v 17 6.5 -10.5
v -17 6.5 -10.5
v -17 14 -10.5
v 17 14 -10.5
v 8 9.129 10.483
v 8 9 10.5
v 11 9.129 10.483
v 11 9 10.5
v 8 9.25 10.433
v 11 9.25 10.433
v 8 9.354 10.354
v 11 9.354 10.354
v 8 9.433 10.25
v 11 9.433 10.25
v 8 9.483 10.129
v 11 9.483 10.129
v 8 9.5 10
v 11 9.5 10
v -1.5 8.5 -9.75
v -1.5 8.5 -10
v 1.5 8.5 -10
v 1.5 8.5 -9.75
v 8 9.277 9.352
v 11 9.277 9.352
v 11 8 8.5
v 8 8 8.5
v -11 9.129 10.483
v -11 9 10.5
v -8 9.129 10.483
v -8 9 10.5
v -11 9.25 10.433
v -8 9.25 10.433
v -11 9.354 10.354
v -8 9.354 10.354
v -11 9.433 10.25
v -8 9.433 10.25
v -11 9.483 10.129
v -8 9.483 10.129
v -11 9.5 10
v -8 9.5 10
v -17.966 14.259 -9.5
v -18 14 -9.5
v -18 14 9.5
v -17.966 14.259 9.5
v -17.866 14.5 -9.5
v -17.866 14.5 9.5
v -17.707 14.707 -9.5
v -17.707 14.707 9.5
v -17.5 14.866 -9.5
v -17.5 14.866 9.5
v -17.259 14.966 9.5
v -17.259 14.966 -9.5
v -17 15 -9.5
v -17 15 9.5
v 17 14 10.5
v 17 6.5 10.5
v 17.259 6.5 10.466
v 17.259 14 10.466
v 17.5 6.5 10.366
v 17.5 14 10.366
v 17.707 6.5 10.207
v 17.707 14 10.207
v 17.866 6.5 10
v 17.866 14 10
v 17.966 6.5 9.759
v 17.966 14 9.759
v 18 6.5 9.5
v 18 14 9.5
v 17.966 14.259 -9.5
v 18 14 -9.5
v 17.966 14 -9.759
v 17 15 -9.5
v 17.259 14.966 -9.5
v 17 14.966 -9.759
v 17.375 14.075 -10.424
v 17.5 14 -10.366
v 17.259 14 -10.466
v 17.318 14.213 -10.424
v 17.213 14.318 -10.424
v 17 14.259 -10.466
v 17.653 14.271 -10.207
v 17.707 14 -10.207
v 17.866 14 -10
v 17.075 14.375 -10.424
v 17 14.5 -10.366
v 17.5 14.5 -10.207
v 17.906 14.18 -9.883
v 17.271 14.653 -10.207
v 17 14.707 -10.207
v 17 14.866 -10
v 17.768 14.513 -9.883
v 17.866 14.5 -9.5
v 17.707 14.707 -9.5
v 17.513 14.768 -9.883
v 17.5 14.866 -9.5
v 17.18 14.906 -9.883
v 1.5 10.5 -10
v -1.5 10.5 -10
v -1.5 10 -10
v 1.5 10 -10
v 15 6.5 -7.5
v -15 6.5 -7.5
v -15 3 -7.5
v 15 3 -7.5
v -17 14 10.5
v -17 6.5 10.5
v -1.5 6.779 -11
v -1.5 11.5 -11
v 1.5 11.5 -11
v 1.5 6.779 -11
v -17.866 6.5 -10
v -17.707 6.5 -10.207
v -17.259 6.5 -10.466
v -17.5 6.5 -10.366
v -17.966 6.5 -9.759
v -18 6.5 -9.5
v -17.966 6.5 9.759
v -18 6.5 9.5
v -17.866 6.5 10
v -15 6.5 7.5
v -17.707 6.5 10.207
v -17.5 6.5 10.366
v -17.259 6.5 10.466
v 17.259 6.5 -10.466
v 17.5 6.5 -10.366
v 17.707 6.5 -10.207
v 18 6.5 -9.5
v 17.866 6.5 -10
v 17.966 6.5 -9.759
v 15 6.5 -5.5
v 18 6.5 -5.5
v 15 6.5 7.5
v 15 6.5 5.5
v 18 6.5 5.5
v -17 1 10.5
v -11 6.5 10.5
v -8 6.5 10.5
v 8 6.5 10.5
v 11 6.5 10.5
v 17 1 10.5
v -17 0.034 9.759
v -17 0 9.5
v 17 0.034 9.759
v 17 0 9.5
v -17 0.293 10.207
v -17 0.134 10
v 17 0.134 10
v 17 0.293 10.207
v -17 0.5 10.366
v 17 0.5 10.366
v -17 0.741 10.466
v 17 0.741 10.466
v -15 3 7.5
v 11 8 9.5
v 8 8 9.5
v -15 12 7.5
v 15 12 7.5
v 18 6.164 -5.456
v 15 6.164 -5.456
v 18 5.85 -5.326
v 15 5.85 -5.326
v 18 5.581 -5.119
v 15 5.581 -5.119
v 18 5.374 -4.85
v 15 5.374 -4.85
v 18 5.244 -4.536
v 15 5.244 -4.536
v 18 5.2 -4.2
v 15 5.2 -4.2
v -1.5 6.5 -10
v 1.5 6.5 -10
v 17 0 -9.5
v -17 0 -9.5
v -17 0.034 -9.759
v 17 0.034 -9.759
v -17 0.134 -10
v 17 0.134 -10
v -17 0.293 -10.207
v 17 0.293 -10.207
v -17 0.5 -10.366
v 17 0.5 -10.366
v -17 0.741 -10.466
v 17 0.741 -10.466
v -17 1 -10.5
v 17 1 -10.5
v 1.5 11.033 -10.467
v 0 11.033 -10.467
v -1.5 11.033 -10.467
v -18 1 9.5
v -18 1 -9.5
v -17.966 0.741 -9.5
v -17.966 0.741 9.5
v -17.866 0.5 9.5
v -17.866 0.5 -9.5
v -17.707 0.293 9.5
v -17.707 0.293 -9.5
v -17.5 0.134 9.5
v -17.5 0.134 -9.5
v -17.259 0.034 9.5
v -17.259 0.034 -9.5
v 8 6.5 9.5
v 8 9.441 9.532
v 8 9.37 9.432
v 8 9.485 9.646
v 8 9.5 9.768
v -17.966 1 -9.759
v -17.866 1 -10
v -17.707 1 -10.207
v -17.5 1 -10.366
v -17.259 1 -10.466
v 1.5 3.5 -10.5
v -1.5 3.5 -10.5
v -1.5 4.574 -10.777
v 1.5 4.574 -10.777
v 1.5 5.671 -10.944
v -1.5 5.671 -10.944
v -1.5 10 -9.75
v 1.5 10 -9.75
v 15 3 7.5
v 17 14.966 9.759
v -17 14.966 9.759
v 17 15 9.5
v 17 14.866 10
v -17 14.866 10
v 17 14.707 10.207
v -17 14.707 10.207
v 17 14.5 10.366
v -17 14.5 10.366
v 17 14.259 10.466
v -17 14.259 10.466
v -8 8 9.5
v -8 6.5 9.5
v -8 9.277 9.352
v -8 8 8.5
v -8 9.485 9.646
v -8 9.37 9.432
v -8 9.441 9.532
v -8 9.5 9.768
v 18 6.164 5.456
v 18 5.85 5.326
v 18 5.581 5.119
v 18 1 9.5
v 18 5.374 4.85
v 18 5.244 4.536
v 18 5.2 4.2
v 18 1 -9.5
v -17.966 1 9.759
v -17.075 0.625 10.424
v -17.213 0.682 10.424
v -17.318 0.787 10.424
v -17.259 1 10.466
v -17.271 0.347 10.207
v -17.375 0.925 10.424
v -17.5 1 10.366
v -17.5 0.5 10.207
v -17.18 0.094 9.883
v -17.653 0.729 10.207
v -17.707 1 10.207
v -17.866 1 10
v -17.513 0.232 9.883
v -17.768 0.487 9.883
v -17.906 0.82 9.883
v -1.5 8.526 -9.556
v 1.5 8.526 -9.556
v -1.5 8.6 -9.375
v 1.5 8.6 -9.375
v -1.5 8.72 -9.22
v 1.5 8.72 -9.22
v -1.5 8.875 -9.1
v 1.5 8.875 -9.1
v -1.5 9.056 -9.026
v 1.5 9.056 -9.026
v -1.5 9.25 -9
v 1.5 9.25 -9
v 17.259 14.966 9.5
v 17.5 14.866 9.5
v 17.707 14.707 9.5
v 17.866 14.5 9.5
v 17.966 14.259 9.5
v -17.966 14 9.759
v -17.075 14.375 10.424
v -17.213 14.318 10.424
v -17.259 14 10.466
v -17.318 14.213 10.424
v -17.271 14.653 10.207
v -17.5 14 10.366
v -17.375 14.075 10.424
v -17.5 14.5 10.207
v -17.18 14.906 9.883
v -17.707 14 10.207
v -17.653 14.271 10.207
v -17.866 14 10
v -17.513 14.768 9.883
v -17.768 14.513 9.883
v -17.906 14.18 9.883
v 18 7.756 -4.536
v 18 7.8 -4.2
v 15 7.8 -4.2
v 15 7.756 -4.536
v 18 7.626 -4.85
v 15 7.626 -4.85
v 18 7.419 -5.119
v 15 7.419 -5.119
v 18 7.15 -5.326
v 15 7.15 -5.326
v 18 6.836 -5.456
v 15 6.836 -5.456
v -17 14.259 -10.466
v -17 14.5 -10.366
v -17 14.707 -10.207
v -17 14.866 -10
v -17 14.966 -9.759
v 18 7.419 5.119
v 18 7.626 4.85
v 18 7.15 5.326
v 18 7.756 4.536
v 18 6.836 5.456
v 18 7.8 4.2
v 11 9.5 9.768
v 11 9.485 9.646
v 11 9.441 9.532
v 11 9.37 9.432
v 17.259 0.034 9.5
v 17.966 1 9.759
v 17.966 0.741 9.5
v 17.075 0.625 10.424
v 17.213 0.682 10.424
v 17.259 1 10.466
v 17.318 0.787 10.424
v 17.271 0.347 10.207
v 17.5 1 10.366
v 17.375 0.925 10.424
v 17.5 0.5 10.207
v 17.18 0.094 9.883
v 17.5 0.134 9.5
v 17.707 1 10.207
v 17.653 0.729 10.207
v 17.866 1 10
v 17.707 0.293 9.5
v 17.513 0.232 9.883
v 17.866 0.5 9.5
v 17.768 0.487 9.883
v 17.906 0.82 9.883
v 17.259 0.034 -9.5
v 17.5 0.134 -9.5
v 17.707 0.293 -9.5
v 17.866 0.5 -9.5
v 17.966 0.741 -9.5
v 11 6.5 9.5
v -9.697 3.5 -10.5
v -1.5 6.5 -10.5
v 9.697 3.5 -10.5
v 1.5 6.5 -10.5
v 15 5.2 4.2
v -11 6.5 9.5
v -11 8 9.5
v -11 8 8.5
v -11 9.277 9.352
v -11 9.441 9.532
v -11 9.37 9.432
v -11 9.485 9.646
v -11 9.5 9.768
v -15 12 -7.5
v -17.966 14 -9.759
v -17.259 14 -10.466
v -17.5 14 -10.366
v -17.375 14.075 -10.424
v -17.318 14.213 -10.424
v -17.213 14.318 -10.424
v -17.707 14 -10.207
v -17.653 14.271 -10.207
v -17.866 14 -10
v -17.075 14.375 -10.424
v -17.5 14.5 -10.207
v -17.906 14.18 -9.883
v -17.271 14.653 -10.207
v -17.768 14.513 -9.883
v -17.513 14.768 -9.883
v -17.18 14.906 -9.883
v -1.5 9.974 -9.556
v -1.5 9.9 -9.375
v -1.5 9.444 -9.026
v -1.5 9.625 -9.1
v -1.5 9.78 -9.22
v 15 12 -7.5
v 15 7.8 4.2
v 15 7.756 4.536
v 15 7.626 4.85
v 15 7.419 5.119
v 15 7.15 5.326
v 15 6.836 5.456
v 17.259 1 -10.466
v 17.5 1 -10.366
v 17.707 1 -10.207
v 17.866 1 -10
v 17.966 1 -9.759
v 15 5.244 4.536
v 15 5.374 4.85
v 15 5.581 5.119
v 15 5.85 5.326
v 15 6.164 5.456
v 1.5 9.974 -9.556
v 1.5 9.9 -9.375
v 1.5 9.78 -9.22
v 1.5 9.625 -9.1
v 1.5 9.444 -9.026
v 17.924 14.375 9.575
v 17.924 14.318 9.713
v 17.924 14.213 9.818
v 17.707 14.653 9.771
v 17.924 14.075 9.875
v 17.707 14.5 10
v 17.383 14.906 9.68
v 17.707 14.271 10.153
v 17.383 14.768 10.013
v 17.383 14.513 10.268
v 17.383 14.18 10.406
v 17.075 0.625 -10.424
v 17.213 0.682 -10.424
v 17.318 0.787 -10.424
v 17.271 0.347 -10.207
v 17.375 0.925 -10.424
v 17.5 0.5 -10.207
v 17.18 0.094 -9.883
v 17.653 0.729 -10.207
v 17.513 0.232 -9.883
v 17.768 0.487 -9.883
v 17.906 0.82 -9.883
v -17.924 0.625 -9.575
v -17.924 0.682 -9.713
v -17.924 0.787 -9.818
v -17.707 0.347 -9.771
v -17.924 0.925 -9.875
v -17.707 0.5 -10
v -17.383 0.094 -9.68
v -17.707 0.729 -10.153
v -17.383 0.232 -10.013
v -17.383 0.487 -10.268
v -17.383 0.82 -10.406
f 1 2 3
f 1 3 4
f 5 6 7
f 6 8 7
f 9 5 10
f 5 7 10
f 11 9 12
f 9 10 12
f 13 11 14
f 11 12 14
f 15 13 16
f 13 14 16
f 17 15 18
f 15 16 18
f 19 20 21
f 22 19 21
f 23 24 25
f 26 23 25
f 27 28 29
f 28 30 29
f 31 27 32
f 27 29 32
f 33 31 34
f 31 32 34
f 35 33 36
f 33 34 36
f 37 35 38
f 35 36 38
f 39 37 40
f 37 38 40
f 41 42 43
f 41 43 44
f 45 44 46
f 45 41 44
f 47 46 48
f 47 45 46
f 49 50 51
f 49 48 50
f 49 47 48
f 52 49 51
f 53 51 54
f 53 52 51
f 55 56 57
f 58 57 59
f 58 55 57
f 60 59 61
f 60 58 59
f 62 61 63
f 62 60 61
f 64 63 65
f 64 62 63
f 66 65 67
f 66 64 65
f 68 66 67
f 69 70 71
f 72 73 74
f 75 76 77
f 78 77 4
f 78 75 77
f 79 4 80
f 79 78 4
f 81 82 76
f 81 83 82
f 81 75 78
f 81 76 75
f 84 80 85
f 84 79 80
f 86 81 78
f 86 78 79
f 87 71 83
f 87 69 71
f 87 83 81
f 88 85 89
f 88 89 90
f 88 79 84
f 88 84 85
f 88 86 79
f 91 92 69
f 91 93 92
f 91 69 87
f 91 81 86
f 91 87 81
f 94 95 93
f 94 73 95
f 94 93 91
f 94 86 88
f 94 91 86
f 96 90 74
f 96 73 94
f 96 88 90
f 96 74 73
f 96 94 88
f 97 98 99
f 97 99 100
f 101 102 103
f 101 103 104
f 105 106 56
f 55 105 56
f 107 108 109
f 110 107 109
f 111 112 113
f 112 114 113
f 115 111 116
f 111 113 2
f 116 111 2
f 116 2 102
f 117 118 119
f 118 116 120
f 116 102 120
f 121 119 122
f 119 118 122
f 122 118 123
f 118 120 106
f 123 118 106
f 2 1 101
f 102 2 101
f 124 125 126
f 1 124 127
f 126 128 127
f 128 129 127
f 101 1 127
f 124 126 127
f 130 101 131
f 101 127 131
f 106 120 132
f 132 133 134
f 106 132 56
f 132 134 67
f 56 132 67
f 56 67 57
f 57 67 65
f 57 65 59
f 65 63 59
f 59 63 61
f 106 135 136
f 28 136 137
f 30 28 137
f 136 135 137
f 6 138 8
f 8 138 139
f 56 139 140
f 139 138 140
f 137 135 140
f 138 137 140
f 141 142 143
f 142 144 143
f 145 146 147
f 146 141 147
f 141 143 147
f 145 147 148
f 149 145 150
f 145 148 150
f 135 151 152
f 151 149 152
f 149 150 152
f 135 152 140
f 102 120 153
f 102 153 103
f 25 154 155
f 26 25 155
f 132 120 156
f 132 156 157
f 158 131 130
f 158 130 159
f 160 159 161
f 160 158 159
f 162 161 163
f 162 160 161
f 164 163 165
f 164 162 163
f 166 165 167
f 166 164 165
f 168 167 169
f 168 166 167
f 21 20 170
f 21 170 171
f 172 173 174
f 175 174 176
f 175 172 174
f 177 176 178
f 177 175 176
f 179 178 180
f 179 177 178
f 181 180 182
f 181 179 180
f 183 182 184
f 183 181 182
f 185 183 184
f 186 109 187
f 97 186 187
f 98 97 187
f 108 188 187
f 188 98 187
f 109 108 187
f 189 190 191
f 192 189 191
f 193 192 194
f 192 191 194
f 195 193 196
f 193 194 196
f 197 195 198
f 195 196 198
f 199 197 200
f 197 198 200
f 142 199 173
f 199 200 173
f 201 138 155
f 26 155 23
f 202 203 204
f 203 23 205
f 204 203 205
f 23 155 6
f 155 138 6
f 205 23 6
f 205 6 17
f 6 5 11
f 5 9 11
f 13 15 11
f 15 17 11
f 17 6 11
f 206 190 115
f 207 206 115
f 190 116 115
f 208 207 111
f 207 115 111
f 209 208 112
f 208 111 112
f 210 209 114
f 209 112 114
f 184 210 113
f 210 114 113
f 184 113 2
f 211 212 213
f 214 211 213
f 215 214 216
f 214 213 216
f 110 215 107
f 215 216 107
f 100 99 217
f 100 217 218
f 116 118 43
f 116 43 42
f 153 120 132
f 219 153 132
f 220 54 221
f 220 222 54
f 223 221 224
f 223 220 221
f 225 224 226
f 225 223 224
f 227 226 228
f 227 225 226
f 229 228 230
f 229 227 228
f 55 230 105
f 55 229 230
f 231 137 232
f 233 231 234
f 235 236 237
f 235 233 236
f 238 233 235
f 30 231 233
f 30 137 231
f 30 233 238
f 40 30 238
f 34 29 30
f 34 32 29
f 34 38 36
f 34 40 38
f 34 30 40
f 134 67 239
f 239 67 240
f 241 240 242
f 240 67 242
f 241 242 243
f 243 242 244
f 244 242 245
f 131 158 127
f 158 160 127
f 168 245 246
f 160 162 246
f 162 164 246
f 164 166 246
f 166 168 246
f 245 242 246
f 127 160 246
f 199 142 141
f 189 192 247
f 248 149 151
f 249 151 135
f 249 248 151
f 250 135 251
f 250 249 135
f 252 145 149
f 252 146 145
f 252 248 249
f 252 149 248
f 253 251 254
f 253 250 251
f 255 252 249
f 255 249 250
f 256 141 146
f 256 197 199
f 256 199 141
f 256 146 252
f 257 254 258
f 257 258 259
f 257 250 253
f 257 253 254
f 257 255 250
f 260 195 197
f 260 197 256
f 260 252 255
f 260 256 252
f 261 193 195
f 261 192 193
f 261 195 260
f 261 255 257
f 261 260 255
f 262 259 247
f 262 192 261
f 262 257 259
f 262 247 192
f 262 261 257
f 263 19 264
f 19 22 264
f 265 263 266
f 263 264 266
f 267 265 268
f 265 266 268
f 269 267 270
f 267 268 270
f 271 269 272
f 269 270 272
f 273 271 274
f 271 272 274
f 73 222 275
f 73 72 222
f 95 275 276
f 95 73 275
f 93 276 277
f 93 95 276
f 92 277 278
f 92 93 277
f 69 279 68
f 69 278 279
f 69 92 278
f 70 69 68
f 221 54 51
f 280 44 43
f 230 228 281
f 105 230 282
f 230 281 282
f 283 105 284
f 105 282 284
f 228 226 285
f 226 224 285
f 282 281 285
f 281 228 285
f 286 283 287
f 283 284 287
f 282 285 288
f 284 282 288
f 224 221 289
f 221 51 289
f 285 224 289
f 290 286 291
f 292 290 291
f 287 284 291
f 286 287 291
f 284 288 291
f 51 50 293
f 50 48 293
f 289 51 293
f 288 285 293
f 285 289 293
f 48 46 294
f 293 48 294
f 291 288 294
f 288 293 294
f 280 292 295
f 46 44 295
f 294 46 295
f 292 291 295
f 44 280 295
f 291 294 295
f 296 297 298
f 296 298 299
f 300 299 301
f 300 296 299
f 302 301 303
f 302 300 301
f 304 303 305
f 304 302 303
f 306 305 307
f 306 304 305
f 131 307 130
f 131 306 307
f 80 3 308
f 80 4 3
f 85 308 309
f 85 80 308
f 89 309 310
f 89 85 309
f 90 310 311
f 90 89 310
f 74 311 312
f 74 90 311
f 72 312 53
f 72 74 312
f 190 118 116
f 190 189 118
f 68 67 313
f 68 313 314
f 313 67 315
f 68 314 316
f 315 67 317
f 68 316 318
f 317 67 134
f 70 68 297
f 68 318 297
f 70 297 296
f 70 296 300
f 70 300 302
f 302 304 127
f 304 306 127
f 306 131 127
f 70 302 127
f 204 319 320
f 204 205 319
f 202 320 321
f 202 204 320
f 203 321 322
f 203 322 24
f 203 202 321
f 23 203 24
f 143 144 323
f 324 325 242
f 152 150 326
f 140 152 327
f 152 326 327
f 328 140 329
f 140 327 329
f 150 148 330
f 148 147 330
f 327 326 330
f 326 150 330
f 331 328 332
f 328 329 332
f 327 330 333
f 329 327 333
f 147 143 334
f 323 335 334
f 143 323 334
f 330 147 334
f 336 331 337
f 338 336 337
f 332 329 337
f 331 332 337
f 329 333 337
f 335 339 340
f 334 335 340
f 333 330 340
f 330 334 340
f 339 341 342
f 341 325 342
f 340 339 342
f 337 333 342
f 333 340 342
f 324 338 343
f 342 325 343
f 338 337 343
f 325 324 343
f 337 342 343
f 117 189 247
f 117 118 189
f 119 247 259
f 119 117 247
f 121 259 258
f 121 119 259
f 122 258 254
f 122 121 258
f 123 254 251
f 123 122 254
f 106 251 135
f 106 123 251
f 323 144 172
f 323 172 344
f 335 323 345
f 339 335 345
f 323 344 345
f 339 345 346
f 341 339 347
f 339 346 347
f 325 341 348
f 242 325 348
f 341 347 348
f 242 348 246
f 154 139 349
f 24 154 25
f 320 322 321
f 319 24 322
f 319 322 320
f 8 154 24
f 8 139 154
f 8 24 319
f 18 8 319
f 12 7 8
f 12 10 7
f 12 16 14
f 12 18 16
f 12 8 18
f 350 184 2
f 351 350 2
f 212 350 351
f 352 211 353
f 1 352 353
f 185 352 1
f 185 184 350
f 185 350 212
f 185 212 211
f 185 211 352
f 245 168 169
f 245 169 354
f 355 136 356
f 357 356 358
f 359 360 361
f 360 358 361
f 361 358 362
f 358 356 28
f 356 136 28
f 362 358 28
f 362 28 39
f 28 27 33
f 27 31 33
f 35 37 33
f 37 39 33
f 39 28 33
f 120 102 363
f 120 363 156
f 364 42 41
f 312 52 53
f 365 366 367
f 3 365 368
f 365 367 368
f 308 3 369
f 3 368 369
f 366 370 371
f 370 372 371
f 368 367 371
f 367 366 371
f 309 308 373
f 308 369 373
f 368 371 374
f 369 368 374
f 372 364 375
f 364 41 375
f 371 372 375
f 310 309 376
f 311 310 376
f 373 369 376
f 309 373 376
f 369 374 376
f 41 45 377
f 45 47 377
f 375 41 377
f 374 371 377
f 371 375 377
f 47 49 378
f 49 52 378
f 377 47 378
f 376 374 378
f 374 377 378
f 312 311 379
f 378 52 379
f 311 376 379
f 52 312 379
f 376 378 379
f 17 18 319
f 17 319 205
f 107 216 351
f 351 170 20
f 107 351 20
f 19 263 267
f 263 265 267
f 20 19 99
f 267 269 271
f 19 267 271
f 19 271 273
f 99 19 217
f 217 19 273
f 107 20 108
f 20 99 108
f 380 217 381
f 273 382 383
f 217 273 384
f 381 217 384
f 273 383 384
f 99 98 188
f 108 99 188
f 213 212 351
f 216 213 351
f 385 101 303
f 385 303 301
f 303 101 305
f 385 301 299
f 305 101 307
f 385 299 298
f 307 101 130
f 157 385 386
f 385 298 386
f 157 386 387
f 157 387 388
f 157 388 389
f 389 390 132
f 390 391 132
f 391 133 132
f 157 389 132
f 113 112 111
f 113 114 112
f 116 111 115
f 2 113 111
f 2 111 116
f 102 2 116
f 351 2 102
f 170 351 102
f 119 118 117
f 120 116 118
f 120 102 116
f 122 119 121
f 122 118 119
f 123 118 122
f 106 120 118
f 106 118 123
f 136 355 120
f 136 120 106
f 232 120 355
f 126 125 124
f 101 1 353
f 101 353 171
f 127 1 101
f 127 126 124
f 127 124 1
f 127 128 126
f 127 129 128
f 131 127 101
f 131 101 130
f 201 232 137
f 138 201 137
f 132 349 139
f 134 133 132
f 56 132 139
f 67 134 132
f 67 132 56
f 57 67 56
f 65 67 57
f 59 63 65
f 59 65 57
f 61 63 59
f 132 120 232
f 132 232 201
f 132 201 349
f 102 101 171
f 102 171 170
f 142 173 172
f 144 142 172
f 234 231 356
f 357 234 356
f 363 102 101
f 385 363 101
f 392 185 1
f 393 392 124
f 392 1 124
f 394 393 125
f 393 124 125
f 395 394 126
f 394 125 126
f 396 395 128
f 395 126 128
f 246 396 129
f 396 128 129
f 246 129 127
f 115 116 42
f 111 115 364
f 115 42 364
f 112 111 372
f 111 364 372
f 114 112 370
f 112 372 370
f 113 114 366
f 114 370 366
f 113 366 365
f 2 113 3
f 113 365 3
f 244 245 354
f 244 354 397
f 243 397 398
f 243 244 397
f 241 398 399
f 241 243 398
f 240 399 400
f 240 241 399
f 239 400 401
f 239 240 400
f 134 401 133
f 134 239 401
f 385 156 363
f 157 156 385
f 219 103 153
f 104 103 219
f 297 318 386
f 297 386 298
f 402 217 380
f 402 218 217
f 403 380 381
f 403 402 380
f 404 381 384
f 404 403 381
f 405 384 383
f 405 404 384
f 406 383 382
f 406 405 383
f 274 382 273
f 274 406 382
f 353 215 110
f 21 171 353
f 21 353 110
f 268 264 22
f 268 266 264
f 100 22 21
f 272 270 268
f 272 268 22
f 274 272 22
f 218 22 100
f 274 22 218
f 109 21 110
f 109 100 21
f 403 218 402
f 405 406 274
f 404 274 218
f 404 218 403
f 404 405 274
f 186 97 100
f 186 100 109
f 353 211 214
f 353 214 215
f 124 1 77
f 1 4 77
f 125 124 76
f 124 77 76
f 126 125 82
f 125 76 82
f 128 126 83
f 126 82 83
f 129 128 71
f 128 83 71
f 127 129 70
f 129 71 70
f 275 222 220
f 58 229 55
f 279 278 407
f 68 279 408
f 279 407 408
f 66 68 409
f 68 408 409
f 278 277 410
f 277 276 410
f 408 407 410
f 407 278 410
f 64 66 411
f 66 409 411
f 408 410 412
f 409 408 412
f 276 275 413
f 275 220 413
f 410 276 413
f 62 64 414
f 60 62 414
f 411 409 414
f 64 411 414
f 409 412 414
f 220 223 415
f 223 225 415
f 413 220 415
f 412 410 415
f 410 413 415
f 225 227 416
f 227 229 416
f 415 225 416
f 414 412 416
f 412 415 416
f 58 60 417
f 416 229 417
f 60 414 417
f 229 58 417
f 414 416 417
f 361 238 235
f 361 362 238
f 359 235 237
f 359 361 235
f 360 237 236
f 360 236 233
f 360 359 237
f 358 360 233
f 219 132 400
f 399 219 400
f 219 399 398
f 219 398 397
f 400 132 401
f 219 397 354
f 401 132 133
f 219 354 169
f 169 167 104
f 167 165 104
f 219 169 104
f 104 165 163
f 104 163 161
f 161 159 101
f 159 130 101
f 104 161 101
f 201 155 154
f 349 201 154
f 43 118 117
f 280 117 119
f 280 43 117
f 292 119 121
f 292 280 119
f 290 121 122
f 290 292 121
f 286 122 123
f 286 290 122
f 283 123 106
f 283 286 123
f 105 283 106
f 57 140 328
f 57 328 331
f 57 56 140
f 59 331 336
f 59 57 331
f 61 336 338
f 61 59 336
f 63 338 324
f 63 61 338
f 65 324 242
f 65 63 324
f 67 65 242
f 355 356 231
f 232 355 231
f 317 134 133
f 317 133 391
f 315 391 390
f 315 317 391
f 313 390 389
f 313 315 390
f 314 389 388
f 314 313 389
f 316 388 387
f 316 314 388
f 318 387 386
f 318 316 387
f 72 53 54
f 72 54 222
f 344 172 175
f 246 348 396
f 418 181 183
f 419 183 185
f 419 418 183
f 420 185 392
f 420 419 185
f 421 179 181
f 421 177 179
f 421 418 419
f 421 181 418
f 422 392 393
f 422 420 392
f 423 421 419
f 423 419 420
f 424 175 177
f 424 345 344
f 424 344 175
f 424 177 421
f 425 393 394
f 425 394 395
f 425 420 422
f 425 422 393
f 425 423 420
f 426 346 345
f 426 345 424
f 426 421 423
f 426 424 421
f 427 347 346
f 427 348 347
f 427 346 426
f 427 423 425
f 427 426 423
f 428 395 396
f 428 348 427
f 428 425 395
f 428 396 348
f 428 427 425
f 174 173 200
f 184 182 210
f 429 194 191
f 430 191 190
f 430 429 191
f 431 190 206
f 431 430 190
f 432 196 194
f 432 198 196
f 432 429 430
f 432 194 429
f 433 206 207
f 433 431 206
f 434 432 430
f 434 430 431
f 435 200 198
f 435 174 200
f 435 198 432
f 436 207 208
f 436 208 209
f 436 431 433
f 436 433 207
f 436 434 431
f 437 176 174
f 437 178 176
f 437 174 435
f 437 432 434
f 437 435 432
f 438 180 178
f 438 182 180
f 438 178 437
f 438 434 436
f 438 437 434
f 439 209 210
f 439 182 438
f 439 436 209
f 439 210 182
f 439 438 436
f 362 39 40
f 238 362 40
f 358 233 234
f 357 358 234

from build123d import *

# Parameters (mm, degrees)
SKETCH1_W           = 36
SKETCH1_H           = 21
BOSS_EXTRUDE2_DEPTH = 15
CUT_EXTRUDE1_DEPTH  = 15
SKETCH5_W           = 30
SKETCH5_H           = 15
CUT_EXTRUDE2_DEPTH  = 3.5
SKETCH7_W           = 30
SKETCH7_H           = 15
CUT_EXTRUDE3_DEPTH  = 5.5
FILLET1_R           = 1
FILLET2_R           = 1
SKETCH9_W           = 3
SKETCH9_H           = 3
BOSS_EXTRUDE3_DEPTH = 1
SKETCH9_4_W         = 3
SKETCH9_4_H         = 3
BOSS_EXTRUDE4_DEPTH = 1
SKETCH10_W          = 3
SKETCH10_H          = 1.5
BOSS_EXTRUDE5_DEPTH = 1
CUT_EXTRUDE4_DEPTH  = 35.296501279
SKETCH12_W          = 3
SKETCH12_H          = 6
BOSS_EXTRUDE6_DEPTH = 0.5
FILLET3_R           = 11
FILLET4_R           = 0.5
SKETCH17_W          = 3
SKETCH17_H          = 2
BOSS_EXTRUDE7_DEPTH = 1
SKETCH18_W          = 3
SKETCH18_H          = 1.5
BOSS_EXTRUDE8_DEPTH = 1
FILLET5_R           = 0.75
FILLET6_SIZE        = 1


# Some blends are built 0.0001 mm under size
with BuildPart() as part:
    # Sketch1 → Boss-Extrude2 (new body)
    with BuildSketch(Plane(origin=(0, 0, 0), x_dir=(1, 0, 0), z_dir=(0, 1, 0))):
        Rectangle(SKETCH1_W, SKETCH1_H)
    extrude(amount=BOSS_EXTRUDE2_DEPTH)

    # Sketch2 → Cut-Extrude1 (cut)
    with BuildSketch(Plane(origin=(18, 0, 0), x_dir=(0, 0, -1), z_dir=(1, 0, 0))):
        with BuildLine():
            Line((-4.2, 7.8), (4.2, 7.8))
            ThreePointArc((4.2, 7.8), (5.5, 6.5), (4.2, 5.2))
            Line((4.2, 5.2), (-4.2, 5.2))
            ThreePointArc((-4.2, 5.2), (-5.5, 6.5), (-4.2, 7.8))
        make_face()
    extrude(amount=-CUT_EXTRUDE1_DEPTH, mode=Mode.SUBTRACT)


with BuildPart() as body_2:
    # Split1: the piece on the far side of the plane
    add(part.part)
    split(bisect_by=Plane.ZX.offset(6.5), keep=Keep.BOTTOM)

    # Sketch5 → Cut-Extrude2 (cut)
    with BuildSketch(Plane(origin=(0, 6.5, 0), x_dir=(1, 0, 0), z_dir=(0, 1, 0))):
        Rectangle(SKETCH5_W, SKETCH5_H)
    extrude(amount=-CUT_EXTRUDE2_DEPTH, mode=Mode.SUBTRACT)

    # Fillet2
    fillet2_edges = [body_2.edges().sort_by_distance(p)[0] for p in [
        (18, 0, 0),
        (0, 0, -10.5),
        (-18, 0, 0),
        (0, 0, 10.5),
        (18, 3.25, 10.5),
        (-18, 3.25, 10.5),
        (-18, 3.25, -10.5),
        (18, 3.25, -10.5),
    ]]
    fillet(fillet2_edges, radius=FILLET2_R)

    # Sketch9 → Boss-Extrude3 (add)
    with BuildSketch(Plane.XY.offset(10.5)):
        with Locations((-9.5, 8)):
            Rectangle(SKETCH9_W, SKETCH9_H)
    extrude(amount=-BOSS_EXTRUDE3_DEPTH)

    # Sketch9<4> → Boss-Extrude4 (add)
    with BuildSketch(Plane.XY.offset(10.5)):
        with Locations((9.5, 8)):
            Rectangle(SKETCH9_4_W, SKETCH9_4_H)
    extrude(amount=-BOSS_EXTRUDE4_DEPTH)

    # Sketch10 → Boss-Extrude5 (add)
    with BuildSketch(Plane(origin=(0, 0, 9.5), x_dir=(-1, 0, 0), z_dir=(0, 0, -1))):
        with Locations((-9.5, 8.75)):
            Rectangle(SKETCH10_W, SKETCH10_H)
        with Locations((9.5, 8.75)):
            Rectangle(SKETCH10_W, SKETCH10_H)
    extrude(amount=BOSS_EXTRUDE5_DEPTH)

    # Sketch11 → Cut-Extrude4 (cut, through all)
    with BuildSketch(Plane(origin=(11, 0, 0), x_dir=(0, 0, -1), z_dir=(1, 0, 0))):
        Polygon((-9.5, 9.5), (-8.5, 8), (-8.5, 9.5), align=None)
    extrude(amount=-CUT_EXTRUDE4_DEPTH, mode=Mode.SUBTRACT)

    # Sketch12 → Boss-Extrude6 (add, symmetric)
    with BuildSketch(Plane(origin=(0, 0, -10.5), x_dir=(-1, 0, 0), z_dir=(0, 0, -1))):
        with Locations((0, 6.5)):
            Rectangle(SKETCH12_W, SKETCH12_H)
    extrude(amount=BOSS_EXTRUDE6_DEPTH, both=True)

    # Fillet3
    # the kernel refuses this fillet: 11 mm, written as the material it takes off along each edge
    with BuildSketch(Plane(origin=(-9.696798155, 3.5, -11), x_dir=(0, 0, 1), z_dir=(1, 0, 0))) as fillet3_piece_1:
        with BuildLine():
            CenterArc((11, -3.278719262), FILLET3_R, 162.658557197, 17.341442803)
            Line((0, -3.278719262), (-0.22, -3.278719262))
            Line((-0.22, -3.278719262), (-0.22, 0))
            Line((-0.22, 0), (0, 0.22))
            ThreePointArc((0, 0.22), (0.25, 0.22), (0.29, 0.065574385))
            Line((0.29, 0.065574385), (0.5, 0))
        make_face()
    extrude(amount=19.393596311, mode=Mode.SUBTRACT)

    # Fillet4
    fillet4_edges = [body_2.edges().sort_by_distance(p)[0] for p in [
        (-9.5, 9.5, 9.5),
        (9.5, 9.5, 9.5),
        (-9.5, 9.5, 10.5),
        (9.5, 9.5, 10.5),
    ]]
    fillet(fillet4_edges, radius=FILLET4_R)

    # Sketch17 → Boss-Extrude7 (add)
    with BuildSketch(Plane.XY.offset(-10)):
        with Locations((0, 10.5)):
            Rectangle(SKETCH17_W, SKETCH17_H)
    extrude(amount=-BOSS_EXTRUDE7_DEPTH)

    # Sketch18 → Boss-Extrude8 (add)
    with BuildSketch(Plane.XY.offset(-10)):
        with Locations((0, 9.25)):
            Rectangle(SKETCH18_W, SKETCH18_H)
    extrude(amount=BOSS_EXTRUDE8_DEPTH)

    # Fillet5
    fillet5_edges = [body_2.edges().sort_by_distance(p)[0] for p in [
        (0, 8.5, -9),
        (0, 10, -9),
    ]]
    fillet(fillet5_edges, radius=FILLET5_R - 0.0001)  # a hair under: the kernel refuses the full size

    # Fillet6
    # a fillet whose section is not a circle: 1 mm, written as the material it takes off along each edge
    with BuildSketch(Plane(origin=(4, 11.5, -10), x_dir=(0, -1, 0), z_dir=(-1, 0, 0))) as fillet6_piece_1:
        with BuildLine():
            Bezier((FILLET6_SIZE, 0), (0, 0), (0, -FILLET6_SIZE), weights=[1, 0.070710678, 1])
            Line((0, -FILLET6_SIZE), (0, 0))
            Line((0, 0), (FILLET6_SIZE, 0))
        make_face()
    extrude(amount=8, mode=Mode.SUBTRACT)


with BuildPart() as part_1:
    add(part.part)

    # Split1
    split(bisect_by=Plane.ZX.offset(6.5), keep=Keep.TOP)

    # Sketch7 → Cut-Extrude3 (cut)
    with BuildSketch(Plane.XZ.offset(-6.5)):
        Rectangle(SKETCH7_W, SKETCH7_H)
    extrude(amount=-CUT_EXTRUDE3_DEPTH, mode=Mode.SUBTRACT)

    # Fillet1
    fillet1_edges = [part_1.edges().sort_by_distance(p)[0] for p in [
        (-18, 15, 0),
        (0, 15, 10.5),
        (18, 15, 0),
        (18, 10.75, 10.5),
        (-18, 10.75, 10.5),
        (-18, 10.75, -10.5),
        (18, 10.75, -10.5),
        (0, 15, -10.5),
    ]]
    fillet(fillet1_edges, radius=FILLET1_R)


solid = Compound([body_2.part, part_1.part])
